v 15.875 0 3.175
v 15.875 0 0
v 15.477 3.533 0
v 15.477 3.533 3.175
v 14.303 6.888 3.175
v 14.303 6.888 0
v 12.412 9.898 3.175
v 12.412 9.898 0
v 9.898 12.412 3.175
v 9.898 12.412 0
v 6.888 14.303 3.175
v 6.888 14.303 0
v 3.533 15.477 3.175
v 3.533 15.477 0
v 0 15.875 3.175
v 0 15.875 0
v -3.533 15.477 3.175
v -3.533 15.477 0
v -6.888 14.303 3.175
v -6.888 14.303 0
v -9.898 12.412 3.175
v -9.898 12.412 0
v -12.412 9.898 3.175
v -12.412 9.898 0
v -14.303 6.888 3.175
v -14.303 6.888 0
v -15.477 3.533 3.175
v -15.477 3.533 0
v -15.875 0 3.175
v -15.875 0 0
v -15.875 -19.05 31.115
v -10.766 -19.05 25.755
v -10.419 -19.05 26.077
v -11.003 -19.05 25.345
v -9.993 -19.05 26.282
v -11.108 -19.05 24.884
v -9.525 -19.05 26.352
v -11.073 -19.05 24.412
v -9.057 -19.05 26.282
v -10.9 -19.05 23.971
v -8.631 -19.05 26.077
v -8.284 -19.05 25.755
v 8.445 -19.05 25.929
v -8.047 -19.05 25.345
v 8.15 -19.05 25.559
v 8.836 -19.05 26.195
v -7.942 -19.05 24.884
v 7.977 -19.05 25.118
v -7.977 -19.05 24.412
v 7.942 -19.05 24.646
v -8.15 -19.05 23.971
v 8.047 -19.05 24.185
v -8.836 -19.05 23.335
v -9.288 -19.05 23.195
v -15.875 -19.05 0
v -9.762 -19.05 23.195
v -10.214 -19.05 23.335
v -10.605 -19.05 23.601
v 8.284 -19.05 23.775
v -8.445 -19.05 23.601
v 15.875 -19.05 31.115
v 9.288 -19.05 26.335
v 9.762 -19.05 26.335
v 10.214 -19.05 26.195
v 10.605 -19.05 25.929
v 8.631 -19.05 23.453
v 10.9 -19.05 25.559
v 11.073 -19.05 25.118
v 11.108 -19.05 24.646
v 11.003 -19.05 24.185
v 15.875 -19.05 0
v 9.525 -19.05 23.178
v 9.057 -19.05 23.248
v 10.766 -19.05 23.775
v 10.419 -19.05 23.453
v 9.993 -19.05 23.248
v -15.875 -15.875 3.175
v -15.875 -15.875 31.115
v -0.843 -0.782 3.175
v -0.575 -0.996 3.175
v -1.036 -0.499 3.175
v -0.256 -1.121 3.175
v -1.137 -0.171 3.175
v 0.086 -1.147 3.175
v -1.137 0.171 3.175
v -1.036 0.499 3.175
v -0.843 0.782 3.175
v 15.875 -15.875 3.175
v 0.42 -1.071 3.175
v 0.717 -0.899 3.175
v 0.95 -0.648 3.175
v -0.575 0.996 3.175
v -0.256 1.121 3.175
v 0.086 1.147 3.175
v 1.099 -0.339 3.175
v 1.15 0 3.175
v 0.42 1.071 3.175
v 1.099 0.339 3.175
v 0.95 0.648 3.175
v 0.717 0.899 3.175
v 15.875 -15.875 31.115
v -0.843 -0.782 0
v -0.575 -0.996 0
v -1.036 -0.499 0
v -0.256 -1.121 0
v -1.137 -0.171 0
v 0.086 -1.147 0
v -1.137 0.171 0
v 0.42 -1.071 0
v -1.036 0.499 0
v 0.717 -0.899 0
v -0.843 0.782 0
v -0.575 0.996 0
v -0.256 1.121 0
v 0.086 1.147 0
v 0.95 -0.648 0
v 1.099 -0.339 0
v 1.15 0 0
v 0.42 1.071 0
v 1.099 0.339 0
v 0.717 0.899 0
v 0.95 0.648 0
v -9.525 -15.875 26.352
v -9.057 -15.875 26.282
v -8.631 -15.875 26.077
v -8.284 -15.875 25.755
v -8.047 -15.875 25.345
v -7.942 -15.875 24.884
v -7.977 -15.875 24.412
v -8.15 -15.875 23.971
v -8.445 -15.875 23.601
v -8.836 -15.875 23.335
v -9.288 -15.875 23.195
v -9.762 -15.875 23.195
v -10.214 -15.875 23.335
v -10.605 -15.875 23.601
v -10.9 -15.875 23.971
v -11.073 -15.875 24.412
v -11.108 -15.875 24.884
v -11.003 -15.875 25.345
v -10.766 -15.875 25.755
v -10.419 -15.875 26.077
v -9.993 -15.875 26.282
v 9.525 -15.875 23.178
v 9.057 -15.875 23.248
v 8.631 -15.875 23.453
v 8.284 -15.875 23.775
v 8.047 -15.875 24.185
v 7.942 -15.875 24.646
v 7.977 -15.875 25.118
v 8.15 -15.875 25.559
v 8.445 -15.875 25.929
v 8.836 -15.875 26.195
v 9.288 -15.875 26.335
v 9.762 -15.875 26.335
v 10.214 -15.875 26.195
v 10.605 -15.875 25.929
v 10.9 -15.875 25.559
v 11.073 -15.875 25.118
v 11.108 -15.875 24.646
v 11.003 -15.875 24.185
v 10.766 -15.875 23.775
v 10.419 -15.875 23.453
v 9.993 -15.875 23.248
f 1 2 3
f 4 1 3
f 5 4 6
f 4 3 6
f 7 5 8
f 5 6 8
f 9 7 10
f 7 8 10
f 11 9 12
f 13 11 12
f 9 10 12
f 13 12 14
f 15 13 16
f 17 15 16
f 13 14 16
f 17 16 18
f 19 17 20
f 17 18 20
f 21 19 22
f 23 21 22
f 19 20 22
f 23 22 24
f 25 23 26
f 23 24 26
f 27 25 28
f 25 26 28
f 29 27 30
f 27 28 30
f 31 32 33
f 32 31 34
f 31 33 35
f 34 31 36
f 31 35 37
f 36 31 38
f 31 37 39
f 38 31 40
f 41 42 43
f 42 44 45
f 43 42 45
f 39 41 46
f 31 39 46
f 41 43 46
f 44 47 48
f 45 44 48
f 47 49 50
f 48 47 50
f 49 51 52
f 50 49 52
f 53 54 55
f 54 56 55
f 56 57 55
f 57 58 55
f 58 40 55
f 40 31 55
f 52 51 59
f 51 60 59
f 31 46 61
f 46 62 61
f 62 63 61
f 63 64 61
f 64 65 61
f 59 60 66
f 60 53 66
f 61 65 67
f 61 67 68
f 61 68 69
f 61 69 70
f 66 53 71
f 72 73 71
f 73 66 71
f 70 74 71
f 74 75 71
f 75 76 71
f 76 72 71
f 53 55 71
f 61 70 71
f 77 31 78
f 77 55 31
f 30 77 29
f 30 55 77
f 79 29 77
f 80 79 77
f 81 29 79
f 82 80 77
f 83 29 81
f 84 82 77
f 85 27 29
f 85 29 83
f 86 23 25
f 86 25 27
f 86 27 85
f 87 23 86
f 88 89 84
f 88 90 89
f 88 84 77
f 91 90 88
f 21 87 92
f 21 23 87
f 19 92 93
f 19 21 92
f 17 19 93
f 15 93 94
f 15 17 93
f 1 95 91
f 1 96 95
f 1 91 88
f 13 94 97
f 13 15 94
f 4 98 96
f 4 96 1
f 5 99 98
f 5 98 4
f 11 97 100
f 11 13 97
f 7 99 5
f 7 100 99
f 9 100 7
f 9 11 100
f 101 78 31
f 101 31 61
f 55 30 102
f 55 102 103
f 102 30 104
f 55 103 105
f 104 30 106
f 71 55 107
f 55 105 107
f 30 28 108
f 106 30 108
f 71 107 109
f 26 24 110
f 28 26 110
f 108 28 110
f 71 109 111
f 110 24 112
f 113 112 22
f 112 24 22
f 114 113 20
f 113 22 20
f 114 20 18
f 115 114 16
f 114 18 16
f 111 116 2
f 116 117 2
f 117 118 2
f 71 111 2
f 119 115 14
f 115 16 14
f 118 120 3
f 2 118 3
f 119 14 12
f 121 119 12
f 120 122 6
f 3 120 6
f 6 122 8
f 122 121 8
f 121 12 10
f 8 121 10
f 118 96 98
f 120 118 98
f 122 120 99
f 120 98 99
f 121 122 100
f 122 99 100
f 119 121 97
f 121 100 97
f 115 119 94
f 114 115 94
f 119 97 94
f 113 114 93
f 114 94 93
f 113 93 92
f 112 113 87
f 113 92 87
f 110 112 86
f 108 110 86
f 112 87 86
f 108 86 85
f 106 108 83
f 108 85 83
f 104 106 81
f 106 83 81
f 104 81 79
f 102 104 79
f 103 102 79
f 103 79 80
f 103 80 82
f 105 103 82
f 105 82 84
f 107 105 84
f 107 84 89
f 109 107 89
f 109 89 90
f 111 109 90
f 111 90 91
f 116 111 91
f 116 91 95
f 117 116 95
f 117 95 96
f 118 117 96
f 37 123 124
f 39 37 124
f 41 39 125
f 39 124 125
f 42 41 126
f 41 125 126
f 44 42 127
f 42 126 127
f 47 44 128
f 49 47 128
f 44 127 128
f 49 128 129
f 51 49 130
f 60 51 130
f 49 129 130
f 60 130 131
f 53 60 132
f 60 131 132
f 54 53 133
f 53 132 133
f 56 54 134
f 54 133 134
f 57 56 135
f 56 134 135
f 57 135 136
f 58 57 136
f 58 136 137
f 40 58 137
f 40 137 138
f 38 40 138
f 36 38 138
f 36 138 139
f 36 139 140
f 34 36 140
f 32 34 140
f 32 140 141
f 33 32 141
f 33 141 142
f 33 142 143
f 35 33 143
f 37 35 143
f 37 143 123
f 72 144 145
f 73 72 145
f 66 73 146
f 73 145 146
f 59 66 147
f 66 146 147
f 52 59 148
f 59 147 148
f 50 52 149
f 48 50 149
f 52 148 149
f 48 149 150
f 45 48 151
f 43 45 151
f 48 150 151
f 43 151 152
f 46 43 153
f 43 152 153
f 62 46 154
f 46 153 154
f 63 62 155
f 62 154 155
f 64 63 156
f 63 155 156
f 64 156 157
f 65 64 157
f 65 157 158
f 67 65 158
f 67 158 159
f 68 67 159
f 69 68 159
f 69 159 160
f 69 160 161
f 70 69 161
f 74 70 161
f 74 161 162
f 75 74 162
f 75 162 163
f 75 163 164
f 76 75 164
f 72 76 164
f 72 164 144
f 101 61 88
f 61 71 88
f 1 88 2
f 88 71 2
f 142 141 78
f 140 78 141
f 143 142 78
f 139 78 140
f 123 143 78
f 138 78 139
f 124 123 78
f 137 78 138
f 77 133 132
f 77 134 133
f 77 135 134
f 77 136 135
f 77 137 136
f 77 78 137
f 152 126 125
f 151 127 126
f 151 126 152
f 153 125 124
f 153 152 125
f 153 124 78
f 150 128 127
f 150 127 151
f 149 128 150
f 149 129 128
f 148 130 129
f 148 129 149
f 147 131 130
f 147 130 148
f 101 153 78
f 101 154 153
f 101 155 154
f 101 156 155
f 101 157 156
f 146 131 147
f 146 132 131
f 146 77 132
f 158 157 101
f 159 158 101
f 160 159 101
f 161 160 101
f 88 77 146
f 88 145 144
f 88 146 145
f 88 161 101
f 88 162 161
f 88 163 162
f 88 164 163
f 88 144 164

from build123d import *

# Parameters (mm, degrees)
BOSS_EXTRUDE1_DEPTH = 3.175
SKETCH4_W           = 31.75
SKETCH4_H           = 3.175
BOSS_EXTRUDE2_DEPTH = 27.94
SKETCH5_R           = 1.5875
CUT_EXTRUDE2_DEPTH  = 48.204039552
SKETCH6_R           = 1.15
CUT_EXTRUDE3_DEPTH  = 38.357217843


with BuildPart() as part:
    # Sketch1 → Boss-Extrude1 (new body)
    with BuildSketch(Plane.XY):
        with BuildLine():
            ThreePointArc((15.875, 0), (0, 15.875), (-15.875, 0))
            Line((-15.875, 0), (15.875, 0))
        make_face()
        with BuildLine():
            ThreePointArc((15.875, 0), (0, -15.875), (-15.875, 0))
            Line((-15.875, 0), (-15.875, -19.05))
            Line((-15.875, -19.05), (15.875, -19.05))
            Line((15.875, -19.05), (15.875, 0))
        make_face()
        with BuildLine():
            Line((15.875, 0), (-15.875, 0))
            ThreePointArc((-15.875, 0), (0, -15.875), (15.875, 0))
        make_face()
    extrude(amount=BOSS_EXTRUDE1_DEPTH)

    # Sketch4 → Boss-Extrude2 (add)
    with BuildSketch(Plane.XY.offset(3.175)):
        with Locations((0, -17.4625)):
            Rectangle(SKETCH4_W, SKETCH4_H)
    extrude(amount=BOSS_EXTRUDE2_DEPTH)

    # Sketch5 → Cut-Extrude2 (cut, through all)
    with BuildSketch(Plane(origin=(0, -15.875, 0), x_dir=(1, 0, 0), z_dir=(0, 1, 0))):
        with Locations(Location((-9.525, -24.765, 0), (0, 0, 270))):
            Circle(SKETCH5_R)
        with Locations(Location((9.525, -24.765, 0), (0, 0, 90))):
            Circle(SKETCH5_R)
    extrude(amount=-CUT_EXTRUDE2_DEPTH, mode=Mode.SUBTRACT)

    # Sketch6 → Cut-Extrude3 (cut, through all)
    with BuildSketch(Plane.XY.offset(3.175)):
        Circle(SKETCH6_R)
    extrude(amount=-CUT_EXTRUDE3_DEPTH, mode=Mode.SUBTRACT)


solid = part.part
